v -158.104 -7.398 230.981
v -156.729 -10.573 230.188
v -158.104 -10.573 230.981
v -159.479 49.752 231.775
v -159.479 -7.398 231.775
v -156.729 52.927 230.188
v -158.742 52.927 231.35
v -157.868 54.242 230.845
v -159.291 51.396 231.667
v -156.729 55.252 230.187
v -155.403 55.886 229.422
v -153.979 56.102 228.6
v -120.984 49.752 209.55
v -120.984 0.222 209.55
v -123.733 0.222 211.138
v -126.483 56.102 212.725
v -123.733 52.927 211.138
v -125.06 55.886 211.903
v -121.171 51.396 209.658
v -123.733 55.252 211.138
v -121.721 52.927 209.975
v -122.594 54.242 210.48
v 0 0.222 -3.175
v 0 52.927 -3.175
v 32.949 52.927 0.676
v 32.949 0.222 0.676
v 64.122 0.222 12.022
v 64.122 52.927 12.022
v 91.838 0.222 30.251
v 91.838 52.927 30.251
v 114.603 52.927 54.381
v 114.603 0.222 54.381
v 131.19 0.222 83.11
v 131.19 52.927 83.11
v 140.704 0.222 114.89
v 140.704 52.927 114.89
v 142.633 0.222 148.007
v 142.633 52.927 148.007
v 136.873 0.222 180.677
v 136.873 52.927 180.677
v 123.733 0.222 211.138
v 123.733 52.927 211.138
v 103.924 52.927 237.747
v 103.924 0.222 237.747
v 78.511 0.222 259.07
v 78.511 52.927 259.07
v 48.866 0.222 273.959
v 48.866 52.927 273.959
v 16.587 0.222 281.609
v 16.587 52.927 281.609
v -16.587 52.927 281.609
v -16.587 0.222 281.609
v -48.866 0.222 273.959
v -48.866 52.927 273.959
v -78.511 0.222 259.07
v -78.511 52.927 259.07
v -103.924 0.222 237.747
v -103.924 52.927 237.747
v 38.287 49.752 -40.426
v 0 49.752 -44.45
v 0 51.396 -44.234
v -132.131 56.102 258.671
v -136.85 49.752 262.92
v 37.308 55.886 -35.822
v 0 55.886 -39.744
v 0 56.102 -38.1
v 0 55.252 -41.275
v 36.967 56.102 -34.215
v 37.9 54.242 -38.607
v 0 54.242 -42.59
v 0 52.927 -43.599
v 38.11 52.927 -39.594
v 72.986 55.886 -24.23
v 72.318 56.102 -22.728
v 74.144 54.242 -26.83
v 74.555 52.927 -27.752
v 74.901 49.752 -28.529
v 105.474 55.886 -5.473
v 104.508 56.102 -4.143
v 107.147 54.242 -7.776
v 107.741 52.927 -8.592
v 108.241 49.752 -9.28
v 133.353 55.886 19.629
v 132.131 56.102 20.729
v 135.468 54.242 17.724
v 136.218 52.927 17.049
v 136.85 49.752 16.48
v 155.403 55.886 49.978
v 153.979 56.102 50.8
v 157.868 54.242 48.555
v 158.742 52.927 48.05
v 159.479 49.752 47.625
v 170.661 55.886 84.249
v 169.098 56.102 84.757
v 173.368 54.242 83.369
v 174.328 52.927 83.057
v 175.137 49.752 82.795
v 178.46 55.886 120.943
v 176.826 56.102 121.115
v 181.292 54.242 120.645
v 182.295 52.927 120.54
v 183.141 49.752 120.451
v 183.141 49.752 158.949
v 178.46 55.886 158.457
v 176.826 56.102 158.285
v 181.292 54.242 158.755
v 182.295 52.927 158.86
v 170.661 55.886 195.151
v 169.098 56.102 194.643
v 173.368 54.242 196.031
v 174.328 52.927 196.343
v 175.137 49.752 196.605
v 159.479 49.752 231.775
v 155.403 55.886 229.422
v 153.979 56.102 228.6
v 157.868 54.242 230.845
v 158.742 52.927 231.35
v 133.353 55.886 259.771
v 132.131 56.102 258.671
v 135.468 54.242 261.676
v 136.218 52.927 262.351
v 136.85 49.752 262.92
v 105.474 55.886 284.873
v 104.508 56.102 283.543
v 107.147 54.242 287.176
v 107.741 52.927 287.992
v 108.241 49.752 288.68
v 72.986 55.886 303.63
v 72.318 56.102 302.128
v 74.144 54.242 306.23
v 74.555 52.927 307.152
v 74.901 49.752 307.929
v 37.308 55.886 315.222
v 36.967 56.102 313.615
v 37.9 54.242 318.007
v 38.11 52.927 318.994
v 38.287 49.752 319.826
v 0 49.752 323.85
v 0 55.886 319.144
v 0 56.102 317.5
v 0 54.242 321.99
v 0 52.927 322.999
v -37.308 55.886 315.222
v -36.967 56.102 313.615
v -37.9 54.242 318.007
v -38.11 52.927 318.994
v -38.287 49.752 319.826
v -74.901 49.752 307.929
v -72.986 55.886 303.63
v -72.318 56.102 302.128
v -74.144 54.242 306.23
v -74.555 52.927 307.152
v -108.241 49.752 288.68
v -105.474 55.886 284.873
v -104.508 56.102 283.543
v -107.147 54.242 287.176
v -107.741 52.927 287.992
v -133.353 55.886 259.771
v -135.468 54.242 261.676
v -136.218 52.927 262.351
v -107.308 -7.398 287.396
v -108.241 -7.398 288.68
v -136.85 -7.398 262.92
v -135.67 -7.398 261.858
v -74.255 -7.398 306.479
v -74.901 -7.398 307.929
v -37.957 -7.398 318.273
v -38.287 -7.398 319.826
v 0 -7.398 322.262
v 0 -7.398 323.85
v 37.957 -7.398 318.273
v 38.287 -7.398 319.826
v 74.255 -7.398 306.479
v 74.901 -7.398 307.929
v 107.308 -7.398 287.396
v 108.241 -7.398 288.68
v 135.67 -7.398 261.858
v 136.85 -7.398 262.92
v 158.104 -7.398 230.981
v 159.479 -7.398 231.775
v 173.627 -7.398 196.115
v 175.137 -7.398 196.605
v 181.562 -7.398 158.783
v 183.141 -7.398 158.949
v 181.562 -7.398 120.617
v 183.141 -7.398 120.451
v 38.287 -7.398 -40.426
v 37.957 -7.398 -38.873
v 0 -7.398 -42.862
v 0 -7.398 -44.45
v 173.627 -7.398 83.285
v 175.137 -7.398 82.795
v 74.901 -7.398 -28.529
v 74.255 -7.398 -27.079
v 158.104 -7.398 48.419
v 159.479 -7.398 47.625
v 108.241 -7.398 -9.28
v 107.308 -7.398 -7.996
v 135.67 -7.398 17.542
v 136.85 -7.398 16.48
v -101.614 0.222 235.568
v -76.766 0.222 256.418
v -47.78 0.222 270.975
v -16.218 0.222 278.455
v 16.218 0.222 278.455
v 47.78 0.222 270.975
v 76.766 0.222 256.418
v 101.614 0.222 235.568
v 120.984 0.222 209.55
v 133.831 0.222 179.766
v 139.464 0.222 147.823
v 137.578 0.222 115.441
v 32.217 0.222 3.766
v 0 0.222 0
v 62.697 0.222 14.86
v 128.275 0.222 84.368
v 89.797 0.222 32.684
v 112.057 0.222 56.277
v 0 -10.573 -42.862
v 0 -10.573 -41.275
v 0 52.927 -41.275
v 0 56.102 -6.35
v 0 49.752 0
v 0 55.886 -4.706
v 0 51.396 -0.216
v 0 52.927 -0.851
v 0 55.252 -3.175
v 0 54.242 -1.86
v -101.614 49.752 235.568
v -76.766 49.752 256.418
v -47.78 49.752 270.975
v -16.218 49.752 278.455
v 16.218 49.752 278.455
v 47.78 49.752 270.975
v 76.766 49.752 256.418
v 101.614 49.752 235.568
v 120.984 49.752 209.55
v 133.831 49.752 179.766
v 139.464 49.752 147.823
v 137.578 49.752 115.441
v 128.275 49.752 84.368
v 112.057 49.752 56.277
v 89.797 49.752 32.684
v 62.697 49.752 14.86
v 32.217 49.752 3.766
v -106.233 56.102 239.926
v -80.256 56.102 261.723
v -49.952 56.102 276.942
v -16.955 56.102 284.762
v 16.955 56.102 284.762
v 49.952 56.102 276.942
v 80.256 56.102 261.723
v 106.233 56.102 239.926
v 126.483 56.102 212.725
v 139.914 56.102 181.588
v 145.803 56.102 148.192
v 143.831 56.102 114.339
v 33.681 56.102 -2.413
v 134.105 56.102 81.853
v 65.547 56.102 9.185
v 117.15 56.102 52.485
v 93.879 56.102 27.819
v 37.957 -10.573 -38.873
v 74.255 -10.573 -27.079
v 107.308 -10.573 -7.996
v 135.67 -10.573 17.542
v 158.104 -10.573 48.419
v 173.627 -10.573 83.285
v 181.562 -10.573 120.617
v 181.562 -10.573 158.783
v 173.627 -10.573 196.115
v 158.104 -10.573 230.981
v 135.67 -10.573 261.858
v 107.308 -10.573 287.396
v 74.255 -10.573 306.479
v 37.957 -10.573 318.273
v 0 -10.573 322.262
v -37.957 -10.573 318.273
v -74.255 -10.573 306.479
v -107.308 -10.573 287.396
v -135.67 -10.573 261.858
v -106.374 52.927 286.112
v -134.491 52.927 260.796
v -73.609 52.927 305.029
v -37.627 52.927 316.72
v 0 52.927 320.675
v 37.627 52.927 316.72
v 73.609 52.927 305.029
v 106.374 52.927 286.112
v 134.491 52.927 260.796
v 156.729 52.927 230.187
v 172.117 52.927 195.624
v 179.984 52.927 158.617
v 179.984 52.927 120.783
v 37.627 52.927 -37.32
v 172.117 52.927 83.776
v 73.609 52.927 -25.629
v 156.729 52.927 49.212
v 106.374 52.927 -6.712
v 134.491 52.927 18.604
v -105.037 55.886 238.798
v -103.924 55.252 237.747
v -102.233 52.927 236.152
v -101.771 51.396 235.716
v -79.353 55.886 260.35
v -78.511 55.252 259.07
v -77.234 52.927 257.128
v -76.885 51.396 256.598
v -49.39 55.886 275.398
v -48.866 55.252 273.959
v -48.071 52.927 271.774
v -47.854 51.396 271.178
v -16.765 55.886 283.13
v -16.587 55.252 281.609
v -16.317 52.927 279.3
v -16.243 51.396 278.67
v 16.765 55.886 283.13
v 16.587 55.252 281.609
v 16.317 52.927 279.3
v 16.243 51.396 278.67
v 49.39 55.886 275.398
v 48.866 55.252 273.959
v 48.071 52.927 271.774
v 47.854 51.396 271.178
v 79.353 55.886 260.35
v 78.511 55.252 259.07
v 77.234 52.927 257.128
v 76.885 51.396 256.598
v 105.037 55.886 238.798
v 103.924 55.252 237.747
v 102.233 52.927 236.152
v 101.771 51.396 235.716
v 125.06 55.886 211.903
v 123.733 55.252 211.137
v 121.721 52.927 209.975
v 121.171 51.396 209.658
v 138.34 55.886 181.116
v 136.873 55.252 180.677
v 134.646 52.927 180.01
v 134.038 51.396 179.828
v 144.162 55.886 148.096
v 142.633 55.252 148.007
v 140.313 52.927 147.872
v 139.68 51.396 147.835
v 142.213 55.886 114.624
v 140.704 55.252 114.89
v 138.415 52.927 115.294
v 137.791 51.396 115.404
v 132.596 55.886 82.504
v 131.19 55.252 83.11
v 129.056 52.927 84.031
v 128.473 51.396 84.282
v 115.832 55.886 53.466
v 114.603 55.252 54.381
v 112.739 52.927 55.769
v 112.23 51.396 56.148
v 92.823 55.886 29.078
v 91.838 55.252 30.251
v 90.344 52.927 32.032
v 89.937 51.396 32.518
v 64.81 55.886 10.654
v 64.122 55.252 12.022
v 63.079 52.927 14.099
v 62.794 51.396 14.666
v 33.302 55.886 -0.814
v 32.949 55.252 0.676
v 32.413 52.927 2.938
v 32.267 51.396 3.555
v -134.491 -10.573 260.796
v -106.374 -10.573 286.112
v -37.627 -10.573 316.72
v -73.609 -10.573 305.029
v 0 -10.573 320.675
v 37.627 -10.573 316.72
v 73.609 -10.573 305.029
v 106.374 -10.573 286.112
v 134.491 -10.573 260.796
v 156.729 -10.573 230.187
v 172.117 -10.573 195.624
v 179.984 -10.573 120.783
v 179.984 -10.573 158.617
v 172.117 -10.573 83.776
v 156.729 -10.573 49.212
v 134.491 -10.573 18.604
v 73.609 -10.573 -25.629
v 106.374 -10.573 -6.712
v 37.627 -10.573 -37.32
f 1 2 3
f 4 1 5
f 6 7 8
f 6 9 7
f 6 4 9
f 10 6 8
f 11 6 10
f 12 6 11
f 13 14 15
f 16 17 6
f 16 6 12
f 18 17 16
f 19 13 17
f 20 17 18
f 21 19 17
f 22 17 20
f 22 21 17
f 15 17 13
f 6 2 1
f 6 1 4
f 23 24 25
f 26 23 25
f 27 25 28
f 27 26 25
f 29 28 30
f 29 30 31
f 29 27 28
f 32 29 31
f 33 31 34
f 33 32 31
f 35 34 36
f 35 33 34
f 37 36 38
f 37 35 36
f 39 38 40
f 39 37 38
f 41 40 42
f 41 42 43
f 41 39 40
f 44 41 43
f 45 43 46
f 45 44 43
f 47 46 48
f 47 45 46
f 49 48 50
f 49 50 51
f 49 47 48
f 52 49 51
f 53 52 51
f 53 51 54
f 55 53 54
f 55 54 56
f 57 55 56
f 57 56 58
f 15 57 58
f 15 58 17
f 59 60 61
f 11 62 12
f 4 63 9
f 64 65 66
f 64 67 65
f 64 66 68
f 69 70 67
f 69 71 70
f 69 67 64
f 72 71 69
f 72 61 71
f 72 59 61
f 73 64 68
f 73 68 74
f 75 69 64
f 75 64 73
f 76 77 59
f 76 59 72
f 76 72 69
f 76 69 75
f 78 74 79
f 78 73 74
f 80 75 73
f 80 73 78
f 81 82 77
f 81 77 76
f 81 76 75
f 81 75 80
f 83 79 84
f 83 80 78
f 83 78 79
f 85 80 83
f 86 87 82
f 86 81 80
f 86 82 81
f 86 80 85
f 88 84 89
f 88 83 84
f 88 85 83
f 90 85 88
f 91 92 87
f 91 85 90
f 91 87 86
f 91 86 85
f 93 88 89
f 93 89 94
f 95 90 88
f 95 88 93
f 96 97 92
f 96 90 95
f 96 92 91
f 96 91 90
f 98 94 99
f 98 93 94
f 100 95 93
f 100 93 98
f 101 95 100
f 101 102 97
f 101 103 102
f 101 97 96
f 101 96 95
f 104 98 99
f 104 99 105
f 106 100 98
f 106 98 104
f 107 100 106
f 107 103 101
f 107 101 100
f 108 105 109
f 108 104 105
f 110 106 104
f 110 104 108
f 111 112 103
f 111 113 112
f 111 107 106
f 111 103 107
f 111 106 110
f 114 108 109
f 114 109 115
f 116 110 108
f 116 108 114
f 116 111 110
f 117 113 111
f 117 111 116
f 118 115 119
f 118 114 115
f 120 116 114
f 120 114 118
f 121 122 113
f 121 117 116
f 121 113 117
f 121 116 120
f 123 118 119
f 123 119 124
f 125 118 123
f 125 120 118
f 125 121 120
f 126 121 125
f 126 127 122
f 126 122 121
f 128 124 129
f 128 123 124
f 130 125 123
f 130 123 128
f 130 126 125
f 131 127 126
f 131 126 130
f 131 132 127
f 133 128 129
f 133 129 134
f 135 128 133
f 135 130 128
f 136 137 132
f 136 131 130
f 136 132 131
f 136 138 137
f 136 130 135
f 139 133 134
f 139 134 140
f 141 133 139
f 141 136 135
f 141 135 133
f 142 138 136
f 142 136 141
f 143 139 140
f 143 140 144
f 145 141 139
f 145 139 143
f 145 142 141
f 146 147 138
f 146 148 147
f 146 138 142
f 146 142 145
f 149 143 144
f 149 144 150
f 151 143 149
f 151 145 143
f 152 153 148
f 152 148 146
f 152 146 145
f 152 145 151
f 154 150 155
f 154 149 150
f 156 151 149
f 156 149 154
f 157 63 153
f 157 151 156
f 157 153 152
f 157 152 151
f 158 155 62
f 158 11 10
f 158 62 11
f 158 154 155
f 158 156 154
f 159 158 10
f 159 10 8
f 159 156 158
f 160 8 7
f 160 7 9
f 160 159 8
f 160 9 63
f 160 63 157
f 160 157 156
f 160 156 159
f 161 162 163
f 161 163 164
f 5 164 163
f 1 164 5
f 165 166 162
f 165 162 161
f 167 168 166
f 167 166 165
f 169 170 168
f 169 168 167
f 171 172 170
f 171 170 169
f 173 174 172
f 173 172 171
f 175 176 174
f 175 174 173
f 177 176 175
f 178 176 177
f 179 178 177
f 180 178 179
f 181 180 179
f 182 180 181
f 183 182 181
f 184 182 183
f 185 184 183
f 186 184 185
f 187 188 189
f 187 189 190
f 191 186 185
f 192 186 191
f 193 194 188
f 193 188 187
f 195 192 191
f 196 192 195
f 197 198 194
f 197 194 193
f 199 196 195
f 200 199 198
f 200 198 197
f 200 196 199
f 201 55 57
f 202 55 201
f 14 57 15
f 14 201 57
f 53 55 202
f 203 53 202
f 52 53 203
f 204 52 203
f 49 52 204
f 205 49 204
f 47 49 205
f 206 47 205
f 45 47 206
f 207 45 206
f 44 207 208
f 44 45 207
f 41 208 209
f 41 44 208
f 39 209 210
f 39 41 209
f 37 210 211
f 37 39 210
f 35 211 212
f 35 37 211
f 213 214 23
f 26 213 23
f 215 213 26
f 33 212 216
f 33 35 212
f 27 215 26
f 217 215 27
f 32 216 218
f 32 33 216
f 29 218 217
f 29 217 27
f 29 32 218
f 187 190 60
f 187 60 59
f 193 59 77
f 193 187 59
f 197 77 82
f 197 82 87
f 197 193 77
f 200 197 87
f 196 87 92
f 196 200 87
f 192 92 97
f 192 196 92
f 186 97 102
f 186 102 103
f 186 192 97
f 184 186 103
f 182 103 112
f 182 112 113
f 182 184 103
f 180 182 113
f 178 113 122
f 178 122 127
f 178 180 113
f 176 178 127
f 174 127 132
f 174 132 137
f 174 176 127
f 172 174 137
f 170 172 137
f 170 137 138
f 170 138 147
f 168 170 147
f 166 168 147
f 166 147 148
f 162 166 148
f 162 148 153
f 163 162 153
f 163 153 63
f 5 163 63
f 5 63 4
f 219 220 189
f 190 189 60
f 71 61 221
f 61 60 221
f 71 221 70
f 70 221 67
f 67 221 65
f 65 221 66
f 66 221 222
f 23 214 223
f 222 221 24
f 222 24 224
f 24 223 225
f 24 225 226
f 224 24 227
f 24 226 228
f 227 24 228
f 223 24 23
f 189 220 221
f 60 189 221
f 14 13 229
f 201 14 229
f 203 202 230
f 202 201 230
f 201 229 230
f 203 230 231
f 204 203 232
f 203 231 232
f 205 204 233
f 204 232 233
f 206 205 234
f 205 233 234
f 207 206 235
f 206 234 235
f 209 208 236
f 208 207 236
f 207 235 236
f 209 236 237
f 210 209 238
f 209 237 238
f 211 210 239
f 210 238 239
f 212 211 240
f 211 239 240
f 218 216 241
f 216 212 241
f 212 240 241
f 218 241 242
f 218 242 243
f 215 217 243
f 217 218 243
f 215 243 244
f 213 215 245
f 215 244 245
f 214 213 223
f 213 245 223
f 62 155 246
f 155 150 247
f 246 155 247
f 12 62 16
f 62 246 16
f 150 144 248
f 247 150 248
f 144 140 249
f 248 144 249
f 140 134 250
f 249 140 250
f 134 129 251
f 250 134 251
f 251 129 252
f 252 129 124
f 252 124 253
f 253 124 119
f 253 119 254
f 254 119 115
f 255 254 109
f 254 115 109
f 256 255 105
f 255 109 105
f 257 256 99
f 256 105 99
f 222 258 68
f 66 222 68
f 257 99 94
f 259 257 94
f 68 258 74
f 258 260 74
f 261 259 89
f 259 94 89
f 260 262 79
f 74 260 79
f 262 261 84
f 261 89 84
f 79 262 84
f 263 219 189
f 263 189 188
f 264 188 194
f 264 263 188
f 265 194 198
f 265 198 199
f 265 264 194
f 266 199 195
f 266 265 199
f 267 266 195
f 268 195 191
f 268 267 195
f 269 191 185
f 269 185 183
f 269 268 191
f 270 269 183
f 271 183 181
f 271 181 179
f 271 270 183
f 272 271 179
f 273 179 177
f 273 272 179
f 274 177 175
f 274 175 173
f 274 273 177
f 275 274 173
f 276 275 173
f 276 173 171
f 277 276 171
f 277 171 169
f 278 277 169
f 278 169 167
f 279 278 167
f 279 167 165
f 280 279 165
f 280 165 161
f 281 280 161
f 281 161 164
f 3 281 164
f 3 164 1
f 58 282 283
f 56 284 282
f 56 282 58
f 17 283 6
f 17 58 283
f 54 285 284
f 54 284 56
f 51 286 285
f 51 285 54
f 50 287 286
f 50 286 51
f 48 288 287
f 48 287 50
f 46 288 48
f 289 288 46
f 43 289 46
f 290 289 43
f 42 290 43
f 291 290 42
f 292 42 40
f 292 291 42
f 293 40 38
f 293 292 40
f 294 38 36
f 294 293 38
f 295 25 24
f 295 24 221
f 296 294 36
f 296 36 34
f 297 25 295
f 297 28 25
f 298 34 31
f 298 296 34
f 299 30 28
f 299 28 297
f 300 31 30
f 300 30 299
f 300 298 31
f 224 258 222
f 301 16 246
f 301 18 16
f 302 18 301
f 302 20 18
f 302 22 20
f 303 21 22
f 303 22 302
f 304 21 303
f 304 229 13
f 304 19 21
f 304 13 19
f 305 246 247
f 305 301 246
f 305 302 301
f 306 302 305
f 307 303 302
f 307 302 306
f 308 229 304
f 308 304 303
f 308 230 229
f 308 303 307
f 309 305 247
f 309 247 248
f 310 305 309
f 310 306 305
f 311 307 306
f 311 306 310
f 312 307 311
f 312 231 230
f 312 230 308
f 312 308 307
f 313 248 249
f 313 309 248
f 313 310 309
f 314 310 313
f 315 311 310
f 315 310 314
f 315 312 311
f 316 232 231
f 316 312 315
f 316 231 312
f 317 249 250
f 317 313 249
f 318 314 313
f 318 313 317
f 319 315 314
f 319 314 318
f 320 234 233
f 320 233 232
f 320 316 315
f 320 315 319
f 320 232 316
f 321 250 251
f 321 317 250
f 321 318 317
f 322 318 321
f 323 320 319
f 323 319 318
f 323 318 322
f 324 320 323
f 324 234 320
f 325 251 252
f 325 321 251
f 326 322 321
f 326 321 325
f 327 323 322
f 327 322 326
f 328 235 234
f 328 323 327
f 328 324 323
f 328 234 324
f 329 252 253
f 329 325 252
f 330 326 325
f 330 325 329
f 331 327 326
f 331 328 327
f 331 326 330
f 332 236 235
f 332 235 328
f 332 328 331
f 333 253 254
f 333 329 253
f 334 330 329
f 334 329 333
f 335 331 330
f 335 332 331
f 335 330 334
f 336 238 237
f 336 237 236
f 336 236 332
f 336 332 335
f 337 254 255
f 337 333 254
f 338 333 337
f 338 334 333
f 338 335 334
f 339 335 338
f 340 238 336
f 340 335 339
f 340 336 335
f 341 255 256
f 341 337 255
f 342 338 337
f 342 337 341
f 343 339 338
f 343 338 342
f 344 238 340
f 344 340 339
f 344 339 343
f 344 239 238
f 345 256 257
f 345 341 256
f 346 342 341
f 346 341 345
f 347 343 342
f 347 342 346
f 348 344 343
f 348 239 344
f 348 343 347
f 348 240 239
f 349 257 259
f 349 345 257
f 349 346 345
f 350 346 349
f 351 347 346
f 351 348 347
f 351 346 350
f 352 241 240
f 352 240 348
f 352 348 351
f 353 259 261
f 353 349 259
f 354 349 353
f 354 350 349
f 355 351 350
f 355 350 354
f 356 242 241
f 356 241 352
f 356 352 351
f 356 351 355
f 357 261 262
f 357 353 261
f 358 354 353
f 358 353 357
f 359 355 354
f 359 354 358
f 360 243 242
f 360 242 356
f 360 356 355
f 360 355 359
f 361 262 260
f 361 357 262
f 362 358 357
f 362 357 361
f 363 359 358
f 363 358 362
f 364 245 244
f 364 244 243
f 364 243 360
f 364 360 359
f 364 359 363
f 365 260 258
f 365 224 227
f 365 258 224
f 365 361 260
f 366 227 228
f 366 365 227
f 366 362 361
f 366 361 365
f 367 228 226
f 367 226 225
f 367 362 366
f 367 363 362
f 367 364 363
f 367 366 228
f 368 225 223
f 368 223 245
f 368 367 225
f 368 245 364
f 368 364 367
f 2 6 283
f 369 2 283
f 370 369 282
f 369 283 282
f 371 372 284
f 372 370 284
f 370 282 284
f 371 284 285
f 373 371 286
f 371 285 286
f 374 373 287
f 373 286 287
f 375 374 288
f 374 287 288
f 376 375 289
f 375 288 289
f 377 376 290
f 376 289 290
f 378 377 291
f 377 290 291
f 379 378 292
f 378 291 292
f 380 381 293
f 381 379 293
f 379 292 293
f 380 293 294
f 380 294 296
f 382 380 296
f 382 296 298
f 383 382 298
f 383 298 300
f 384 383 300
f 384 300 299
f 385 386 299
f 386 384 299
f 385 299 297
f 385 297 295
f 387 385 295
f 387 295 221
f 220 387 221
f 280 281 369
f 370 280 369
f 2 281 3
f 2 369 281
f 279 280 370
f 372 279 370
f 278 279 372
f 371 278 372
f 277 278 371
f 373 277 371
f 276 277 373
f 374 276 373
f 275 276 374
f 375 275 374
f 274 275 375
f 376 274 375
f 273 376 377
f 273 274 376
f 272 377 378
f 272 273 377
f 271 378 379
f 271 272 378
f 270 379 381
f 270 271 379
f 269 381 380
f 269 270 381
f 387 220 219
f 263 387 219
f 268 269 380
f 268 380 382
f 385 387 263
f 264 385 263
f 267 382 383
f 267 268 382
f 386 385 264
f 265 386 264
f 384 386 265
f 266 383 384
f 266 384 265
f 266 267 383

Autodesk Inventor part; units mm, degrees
ref_plane "YZ Plane" through (0, 0, 0) normal (1, 0, 0) x (0, 1, 0)
ref_plane "XZ Plane" through (0, 0, 0) normal (0, 1, 0) x (-1, 0, 0)
ref_plane "XY Plane" through (0, 0, 0) normal (0, 0, 1) x (1, 0, 0)
sketch "Sketch1" plane through (0, 0, 0) normal (1, 0, 0) x (0, 1, 0)
  line L0 (0.2223, 0) -> (56.1023, 0)
  line L1 (56.1023, 0) -> (56.1023, -44.45)
  line L2 (56.1023, -44.45) -> (-7.3977, -44.45)
  line L3 (-7.3977, -44.45) -> (-7.3977, -42.8625)
  line L4 (-7.3977, -42.8625) -> (-10.5727, -42.8625)
  line L5 (-10.5727, -42.8625) -> (-10.5727, -41.275)
  line L6 (-10.5727, -41.275) -> (52.9273, -41.275)
  line L7 (52.9273, -41.275) -> (52.9273, -3.175)
  line L8 (52.9273, -3.175) -> (0.2223, -3.175)
  line L9 (0.2223, -3.175) -> (0.2223, 0)
  line L10 (68.5874, 139.7) -> (-16.5119, 139.7)
  point P0 (0, 0)
  dimension "d0" = 55.88
  dimension "d1" = 44.45
  dimension "d2" = 63.5
  dimension "d3" = 1.5875
  dimension "d4" = 90
  dimension "d5" = 3.175
  dimension "d6" = 1.5875
  dimension "d7" = 63.5
  dimension "d8" = 38.1
  dimension "d9" = 90
  dimension "d10" = 139.7
revolve "Revolution1" add sketch "Sketch1" angle 240 about axis through (0, 68.5874, 139.7) along (0, -1, 0)
fillet "Fillet1" radius 6.35 1 edges at (159.4786, 56.1023, 231.775)
fillet "Fillet2" radius 6.35 1 edges at (120.9837, 56.1023, 209.55)
properties part number "Top"
